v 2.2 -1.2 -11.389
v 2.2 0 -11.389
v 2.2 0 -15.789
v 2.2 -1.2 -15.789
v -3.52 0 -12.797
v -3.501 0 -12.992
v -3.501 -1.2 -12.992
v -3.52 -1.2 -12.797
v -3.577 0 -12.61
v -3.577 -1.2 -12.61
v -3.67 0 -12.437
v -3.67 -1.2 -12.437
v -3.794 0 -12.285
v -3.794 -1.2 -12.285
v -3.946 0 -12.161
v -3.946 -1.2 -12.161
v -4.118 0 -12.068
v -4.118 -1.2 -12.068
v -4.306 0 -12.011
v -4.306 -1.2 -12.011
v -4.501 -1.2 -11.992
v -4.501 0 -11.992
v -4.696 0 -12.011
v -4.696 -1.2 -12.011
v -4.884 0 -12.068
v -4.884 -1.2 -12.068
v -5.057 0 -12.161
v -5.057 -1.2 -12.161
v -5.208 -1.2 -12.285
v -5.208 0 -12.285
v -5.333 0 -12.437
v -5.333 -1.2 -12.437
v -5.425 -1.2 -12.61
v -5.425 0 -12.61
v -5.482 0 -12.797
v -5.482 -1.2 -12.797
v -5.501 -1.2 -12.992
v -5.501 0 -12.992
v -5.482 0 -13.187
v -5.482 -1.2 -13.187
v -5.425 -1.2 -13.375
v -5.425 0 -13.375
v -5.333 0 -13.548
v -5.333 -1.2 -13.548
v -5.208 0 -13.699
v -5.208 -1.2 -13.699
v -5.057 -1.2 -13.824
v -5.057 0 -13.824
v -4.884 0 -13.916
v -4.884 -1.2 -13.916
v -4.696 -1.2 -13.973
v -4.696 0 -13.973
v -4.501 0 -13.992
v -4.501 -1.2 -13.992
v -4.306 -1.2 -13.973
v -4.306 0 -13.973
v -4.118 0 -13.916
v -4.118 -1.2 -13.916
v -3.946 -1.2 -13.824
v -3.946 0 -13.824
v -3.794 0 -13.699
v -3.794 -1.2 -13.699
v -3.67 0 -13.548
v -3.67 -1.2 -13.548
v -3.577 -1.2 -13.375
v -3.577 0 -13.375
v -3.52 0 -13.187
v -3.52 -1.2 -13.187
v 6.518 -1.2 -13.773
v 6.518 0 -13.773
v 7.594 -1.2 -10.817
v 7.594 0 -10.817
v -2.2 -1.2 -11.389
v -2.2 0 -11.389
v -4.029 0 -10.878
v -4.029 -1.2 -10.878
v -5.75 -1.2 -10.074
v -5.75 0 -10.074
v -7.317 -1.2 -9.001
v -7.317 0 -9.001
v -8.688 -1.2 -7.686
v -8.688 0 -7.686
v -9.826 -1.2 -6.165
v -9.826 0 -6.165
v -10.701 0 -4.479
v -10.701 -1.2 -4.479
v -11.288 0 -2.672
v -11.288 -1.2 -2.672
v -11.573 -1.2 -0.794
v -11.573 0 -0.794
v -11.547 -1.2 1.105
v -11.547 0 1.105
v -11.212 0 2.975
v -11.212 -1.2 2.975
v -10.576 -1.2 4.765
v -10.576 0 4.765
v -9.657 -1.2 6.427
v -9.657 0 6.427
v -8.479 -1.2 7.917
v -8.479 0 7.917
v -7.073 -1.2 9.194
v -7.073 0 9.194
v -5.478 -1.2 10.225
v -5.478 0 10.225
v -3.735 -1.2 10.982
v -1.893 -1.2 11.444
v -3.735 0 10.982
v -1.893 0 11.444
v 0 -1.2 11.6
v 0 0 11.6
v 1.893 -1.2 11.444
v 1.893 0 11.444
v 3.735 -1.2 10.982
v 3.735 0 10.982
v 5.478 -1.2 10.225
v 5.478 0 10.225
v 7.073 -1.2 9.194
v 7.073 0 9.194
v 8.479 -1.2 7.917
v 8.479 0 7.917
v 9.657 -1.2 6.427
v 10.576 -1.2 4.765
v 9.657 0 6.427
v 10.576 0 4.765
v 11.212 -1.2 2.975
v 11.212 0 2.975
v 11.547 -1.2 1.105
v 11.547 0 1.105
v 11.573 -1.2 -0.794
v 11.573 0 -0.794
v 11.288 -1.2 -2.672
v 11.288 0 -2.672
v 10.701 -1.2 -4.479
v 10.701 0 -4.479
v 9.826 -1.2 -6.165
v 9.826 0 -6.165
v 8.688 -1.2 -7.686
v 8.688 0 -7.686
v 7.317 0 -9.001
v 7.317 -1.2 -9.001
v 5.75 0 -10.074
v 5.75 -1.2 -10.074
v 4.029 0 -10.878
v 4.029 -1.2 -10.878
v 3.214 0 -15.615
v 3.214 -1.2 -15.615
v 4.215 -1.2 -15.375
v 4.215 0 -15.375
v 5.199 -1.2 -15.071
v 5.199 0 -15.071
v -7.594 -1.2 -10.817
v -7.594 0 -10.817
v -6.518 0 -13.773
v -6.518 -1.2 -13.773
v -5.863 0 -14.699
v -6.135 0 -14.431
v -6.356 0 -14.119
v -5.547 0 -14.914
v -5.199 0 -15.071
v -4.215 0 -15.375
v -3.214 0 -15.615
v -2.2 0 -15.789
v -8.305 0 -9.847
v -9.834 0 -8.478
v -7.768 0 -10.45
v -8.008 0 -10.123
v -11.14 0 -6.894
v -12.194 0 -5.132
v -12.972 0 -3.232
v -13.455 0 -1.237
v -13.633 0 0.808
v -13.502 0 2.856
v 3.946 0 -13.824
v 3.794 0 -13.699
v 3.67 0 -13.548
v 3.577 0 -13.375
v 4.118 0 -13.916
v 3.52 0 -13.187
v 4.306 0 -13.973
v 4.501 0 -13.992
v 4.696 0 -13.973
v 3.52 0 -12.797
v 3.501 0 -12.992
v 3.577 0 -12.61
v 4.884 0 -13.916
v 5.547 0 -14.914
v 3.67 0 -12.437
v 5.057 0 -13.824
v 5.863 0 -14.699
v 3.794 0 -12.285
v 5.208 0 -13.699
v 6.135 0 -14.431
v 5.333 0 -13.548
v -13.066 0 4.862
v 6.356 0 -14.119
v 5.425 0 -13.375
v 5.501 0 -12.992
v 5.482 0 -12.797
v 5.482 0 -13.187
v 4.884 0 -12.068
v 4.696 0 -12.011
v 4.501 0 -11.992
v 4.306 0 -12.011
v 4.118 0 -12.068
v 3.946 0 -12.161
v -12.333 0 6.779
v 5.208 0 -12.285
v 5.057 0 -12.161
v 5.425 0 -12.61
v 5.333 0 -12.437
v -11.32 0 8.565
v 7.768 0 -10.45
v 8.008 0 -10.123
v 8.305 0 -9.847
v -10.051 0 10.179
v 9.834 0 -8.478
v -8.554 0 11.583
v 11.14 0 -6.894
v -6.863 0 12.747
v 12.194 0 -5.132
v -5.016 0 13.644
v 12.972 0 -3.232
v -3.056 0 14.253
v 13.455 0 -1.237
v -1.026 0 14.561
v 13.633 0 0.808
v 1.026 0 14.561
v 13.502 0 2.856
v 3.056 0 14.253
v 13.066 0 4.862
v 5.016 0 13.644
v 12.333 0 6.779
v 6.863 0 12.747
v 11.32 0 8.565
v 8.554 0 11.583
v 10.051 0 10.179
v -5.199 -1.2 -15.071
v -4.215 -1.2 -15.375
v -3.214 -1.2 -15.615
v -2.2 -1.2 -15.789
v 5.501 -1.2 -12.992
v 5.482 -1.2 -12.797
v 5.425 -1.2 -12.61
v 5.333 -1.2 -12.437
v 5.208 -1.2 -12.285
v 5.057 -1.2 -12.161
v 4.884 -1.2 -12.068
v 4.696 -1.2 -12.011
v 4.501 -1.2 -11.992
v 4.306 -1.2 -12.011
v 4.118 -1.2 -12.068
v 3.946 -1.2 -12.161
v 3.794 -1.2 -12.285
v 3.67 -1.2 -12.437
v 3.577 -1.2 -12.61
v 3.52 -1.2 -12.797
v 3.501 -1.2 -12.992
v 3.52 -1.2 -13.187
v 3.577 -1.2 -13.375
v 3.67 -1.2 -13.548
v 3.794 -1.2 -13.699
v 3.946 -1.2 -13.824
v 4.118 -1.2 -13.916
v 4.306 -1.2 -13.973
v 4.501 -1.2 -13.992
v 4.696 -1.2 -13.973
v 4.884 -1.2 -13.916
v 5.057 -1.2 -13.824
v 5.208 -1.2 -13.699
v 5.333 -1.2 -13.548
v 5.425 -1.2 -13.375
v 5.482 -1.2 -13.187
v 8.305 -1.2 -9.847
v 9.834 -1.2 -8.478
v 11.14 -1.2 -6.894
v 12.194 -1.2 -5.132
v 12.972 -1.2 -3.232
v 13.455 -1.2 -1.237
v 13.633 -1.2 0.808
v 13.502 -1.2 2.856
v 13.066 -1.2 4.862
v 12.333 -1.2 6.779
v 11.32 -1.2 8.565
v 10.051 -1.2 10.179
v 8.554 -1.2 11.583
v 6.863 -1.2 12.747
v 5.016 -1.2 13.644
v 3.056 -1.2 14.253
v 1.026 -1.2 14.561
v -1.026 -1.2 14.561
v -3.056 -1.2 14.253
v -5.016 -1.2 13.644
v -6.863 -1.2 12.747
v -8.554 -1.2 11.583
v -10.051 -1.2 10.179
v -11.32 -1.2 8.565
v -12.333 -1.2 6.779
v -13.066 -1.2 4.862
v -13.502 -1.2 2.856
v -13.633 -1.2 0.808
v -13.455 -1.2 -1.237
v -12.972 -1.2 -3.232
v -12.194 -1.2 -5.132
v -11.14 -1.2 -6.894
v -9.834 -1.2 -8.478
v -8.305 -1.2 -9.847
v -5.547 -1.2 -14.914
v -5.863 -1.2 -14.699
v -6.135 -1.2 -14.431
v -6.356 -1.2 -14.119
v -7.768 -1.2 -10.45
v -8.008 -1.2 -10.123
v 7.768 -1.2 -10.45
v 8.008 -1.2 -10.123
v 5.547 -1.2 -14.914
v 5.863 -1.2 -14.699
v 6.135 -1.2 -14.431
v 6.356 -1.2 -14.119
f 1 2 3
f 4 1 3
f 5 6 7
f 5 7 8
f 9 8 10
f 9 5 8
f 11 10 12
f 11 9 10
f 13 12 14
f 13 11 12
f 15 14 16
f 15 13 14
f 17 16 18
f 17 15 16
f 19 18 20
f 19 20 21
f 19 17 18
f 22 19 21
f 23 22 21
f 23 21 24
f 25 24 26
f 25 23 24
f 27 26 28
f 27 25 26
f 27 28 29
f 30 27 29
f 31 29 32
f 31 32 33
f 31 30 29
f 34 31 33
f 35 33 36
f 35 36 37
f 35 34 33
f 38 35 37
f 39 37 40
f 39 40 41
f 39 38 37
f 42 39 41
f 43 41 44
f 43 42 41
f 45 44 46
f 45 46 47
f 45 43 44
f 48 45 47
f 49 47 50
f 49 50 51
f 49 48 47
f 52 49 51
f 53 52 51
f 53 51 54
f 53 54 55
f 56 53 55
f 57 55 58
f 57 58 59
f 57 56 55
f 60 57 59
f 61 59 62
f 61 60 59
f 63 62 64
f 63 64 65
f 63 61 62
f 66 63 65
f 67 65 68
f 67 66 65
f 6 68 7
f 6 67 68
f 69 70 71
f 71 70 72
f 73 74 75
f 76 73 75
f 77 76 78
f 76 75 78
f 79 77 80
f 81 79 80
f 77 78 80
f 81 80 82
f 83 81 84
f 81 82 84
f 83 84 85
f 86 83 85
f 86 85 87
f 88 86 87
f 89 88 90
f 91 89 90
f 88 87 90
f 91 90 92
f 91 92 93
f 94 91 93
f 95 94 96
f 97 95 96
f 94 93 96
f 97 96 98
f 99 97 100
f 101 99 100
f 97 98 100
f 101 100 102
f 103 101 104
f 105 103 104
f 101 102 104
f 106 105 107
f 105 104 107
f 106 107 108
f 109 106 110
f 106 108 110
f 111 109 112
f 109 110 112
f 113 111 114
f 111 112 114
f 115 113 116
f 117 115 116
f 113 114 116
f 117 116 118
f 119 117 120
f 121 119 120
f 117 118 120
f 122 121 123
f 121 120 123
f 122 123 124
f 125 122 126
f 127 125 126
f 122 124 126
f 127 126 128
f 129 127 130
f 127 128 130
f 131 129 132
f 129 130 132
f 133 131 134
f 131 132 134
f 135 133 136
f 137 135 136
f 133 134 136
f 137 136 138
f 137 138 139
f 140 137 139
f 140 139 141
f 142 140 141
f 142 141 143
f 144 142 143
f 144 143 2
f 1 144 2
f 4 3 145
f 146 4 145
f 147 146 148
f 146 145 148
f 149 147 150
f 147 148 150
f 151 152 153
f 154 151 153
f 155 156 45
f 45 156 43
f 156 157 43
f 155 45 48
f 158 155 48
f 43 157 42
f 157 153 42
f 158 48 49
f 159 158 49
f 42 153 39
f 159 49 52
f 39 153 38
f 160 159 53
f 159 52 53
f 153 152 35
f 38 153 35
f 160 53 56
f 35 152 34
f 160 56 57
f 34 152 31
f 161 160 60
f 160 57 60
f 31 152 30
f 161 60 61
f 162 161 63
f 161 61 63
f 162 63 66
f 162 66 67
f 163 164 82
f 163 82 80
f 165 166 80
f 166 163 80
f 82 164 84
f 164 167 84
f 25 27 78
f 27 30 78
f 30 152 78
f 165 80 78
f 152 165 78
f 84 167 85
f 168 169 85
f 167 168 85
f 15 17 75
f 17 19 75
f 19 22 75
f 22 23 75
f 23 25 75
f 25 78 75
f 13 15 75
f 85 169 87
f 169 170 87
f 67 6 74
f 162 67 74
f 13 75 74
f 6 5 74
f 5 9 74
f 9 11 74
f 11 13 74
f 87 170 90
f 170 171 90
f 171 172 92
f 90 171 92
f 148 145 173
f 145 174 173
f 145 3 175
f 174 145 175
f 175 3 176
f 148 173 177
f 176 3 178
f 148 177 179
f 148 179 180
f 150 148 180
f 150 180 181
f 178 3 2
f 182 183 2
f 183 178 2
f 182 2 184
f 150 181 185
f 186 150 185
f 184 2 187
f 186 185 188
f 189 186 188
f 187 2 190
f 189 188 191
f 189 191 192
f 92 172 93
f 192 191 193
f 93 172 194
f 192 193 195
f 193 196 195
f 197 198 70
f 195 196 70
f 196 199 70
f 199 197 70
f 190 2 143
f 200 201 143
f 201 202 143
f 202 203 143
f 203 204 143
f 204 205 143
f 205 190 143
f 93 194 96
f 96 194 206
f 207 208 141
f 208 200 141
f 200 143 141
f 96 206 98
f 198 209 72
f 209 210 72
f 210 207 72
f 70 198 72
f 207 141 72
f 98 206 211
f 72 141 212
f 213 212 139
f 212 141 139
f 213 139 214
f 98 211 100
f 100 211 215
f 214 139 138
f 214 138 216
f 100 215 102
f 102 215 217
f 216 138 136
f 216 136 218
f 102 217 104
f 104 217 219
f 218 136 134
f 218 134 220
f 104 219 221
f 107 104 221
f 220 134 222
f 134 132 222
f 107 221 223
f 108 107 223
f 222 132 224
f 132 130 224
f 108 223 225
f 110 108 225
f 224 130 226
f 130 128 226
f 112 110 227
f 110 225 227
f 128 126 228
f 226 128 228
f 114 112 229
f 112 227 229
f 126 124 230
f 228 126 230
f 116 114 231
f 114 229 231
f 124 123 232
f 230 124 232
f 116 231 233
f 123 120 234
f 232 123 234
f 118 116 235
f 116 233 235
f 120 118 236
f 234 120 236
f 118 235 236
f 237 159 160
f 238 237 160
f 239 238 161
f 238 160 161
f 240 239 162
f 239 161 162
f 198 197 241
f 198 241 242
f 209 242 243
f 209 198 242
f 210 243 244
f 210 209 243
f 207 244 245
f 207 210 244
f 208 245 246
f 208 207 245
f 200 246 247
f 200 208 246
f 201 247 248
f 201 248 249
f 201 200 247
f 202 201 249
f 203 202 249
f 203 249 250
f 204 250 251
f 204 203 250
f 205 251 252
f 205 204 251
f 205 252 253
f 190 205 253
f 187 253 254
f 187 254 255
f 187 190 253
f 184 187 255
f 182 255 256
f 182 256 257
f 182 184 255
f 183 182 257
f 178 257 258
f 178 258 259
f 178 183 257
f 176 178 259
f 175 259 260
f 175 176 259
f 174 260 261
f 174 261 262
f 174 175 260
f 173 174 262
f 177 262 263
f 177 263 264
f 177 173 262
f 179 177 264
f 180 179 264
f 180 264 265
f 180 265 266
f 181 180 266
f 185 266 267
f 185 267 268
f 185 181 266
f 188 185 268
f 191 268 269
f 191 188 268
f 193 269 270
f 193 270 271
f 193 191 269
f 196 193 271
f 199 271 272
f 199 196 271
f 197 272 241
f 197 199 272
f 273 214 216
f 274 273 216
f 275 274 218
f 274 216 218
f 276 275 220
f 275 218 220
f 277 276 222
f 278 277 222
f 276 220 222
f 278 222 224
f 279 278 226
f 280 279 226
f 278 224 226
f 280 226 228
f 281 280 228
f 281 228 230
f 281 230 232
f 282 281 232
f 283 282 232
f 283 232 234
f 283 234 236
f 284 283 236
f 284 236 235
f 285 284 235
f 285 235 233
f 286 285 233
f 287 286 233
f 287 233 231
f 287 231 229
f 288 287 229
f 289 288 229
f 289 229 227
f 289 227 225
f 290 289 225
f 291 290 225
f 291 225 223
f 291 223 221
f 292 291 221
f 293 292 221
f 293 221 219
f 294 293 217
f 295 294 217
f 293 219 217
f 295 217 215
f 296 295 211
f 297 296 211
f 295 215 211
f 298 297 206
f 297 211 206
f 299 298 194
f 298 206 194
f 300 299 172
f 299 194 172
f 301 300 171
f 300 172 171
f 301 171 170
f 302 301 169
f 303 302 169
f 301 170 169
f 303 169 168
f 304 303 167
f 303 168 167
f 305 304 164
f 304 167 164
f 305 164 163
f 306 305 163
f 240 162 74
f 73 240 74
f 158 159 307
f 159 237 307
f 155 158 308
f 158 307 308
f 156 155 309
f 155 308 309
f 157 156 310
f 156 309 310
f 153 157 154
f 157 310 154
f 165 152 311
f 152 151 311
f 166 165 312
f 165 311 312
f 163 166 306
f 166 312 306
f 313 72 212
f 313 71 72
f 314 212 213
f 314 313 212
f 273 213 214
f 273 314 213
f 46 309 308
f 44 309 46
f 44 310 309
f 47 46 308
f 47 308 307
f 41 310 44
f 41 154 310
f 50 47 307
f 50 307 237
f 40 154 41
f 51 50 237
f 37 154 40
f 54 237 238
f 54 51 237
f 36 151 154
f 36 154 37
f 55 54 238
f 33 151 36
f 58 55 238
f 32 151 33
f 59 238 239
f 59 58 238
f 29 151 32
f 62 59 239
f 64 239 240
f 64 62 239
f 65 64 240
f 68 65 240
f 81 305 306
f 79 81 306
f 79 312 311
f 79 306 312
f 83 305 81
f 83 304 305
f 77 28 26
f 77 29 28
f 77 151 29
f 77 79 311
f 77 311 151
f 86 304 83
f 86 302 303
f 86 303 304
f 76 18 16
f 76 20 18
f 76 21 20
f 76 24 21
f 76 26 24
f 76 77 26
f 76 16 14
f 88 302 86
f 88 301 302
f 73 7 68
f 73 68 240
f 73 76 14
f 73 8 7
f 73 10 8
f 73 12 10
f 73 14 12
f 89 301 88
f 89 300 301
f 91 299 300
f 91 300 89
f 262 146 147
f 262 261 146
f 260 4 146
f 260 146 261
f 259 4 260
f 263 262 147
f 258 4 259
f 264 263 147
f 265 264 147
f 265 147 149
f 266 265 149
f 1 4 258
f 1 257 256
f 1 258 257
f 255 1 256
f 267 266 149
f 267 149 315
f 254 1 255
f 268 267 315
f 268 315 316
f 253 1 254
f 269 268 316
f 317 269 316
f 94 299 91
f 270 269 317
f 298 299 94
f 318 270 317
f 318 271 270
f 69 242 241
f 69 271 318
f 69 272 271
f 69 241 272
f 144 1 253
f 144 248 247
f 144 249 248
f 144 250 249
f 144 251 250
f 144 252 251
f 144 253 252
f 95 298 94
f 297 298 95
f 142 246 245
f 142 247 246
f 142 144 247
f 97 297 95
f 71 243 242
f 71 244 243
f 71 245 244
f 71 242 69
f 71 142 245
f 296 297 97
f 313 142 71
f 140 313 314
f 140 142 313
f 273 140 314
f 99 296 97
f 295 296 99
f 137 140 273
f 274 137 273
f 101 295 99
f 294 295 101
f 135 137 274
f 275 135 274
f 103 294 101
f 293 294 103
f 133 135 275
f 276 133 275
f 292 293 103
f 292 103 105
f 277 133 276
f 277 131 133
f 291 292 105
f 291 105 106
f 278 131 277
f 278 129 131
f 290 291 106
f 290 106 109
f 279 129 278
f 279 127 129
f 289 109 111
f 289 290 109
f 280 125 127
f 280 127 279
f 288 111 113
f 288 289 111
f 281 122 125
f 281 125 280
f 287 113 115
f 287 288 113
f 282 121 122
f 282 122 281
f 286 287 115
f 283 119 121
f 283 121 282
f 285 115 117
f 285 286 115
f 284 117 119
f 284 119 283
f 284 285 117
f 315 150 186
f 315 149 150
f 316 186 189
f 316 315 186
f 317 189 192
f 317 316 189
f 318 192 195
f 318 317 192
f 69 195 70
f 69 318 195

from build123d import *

# Parameters (mm, degrees)
F0_R     = 1
F1_DEPTH = 1.2
F2_R     = 2.15


# Not quite as in the source:
# - a feature names something its author has since deleted; it is built from what else it names


with BuildPart() as f1:
    # F0 (on Front) → F1 (new body)
    with BuildSketch(Plane.XZ):
        with BuildLine():
            ThreePointArc((-2.2, -11.3894688199), (0, 11.6), (2.2, -11.3894688199))
            Line((2.2, -11.3894688199), (2.2, -12.4894688199))
            ThreePointArc((2.2, -12.4894688199), (5.1370226671, -11.6633518005), (7.8168023095, -10.2048071338))
            ThreePointArc((7.8168023095, -10.2048071338), (0, 14.6), (-7.8168023095, -10.2048071338))
            ThreePointArc((-7.8168023095, -10.2048071338), (-5.1370226671, -11.6633518005), (-2.2, -12.4894688199))
            Line((-2.2, -12.4894688199), (-2.2, -11.3894688199))
        make_face()
        with BuildLine():
            ThreePointArc((7.8168023095, -10.2048071338), (5.1370226671, -11.6633518005), (2.2, -12.4894688199))
            Line((2.2, -12.4894688199), (2.2, -15.7894688199))
            ThreePointArc((2.2, -15.7894688199), (4.2270149149, -15.3713913009), (6.1827847392, -14.6942335113))
            Line((6.1827847392, -14.6942335113), (7.8168023095, -10.2048071338))
        make_face()
        with Locations((4.5011299048, -12.9922397434)):
            Circle(F0_R, mode=Mode.SUBTRACT)
        with BuildLine():
            Line((-2.2, -15.7894688199), (-2.2, -12.4894688199))
            ThreePointArc((-2.2, -12.4894688199), (-5.1370226671, -11.6633518005), (-7.8168023095, -10.2048071338))
            Line((-7.8168023095, -10.2048071338), (-6.1827847392, -14.6942335113))
            ThreePointArc((-6.1827847392, -14.6942335113), (-4.2270149149, -15.3713913009), (-2.2, -15.7894688199))
        make_face()
        with Locations((-4.5011299048, -12.9922397434)):
            Circle(F0_R, mode=Mode.SUBTRACT)
    extrude(amount=F1_DEPTH)

    # F2
    f2_edges = [f1.edges().sort_by_distance(p)[0] for p in [
        (6.182785, -0.6, -14.694234),
        (-6.182785, -0.6, -14.694234),
        (-7.816802, -0.6, -10.204807),
        (7.816802, -0.6, -10.204807),
    ]]
    fillet(f2_edges, radius=F2_R)


solid = f1.part
